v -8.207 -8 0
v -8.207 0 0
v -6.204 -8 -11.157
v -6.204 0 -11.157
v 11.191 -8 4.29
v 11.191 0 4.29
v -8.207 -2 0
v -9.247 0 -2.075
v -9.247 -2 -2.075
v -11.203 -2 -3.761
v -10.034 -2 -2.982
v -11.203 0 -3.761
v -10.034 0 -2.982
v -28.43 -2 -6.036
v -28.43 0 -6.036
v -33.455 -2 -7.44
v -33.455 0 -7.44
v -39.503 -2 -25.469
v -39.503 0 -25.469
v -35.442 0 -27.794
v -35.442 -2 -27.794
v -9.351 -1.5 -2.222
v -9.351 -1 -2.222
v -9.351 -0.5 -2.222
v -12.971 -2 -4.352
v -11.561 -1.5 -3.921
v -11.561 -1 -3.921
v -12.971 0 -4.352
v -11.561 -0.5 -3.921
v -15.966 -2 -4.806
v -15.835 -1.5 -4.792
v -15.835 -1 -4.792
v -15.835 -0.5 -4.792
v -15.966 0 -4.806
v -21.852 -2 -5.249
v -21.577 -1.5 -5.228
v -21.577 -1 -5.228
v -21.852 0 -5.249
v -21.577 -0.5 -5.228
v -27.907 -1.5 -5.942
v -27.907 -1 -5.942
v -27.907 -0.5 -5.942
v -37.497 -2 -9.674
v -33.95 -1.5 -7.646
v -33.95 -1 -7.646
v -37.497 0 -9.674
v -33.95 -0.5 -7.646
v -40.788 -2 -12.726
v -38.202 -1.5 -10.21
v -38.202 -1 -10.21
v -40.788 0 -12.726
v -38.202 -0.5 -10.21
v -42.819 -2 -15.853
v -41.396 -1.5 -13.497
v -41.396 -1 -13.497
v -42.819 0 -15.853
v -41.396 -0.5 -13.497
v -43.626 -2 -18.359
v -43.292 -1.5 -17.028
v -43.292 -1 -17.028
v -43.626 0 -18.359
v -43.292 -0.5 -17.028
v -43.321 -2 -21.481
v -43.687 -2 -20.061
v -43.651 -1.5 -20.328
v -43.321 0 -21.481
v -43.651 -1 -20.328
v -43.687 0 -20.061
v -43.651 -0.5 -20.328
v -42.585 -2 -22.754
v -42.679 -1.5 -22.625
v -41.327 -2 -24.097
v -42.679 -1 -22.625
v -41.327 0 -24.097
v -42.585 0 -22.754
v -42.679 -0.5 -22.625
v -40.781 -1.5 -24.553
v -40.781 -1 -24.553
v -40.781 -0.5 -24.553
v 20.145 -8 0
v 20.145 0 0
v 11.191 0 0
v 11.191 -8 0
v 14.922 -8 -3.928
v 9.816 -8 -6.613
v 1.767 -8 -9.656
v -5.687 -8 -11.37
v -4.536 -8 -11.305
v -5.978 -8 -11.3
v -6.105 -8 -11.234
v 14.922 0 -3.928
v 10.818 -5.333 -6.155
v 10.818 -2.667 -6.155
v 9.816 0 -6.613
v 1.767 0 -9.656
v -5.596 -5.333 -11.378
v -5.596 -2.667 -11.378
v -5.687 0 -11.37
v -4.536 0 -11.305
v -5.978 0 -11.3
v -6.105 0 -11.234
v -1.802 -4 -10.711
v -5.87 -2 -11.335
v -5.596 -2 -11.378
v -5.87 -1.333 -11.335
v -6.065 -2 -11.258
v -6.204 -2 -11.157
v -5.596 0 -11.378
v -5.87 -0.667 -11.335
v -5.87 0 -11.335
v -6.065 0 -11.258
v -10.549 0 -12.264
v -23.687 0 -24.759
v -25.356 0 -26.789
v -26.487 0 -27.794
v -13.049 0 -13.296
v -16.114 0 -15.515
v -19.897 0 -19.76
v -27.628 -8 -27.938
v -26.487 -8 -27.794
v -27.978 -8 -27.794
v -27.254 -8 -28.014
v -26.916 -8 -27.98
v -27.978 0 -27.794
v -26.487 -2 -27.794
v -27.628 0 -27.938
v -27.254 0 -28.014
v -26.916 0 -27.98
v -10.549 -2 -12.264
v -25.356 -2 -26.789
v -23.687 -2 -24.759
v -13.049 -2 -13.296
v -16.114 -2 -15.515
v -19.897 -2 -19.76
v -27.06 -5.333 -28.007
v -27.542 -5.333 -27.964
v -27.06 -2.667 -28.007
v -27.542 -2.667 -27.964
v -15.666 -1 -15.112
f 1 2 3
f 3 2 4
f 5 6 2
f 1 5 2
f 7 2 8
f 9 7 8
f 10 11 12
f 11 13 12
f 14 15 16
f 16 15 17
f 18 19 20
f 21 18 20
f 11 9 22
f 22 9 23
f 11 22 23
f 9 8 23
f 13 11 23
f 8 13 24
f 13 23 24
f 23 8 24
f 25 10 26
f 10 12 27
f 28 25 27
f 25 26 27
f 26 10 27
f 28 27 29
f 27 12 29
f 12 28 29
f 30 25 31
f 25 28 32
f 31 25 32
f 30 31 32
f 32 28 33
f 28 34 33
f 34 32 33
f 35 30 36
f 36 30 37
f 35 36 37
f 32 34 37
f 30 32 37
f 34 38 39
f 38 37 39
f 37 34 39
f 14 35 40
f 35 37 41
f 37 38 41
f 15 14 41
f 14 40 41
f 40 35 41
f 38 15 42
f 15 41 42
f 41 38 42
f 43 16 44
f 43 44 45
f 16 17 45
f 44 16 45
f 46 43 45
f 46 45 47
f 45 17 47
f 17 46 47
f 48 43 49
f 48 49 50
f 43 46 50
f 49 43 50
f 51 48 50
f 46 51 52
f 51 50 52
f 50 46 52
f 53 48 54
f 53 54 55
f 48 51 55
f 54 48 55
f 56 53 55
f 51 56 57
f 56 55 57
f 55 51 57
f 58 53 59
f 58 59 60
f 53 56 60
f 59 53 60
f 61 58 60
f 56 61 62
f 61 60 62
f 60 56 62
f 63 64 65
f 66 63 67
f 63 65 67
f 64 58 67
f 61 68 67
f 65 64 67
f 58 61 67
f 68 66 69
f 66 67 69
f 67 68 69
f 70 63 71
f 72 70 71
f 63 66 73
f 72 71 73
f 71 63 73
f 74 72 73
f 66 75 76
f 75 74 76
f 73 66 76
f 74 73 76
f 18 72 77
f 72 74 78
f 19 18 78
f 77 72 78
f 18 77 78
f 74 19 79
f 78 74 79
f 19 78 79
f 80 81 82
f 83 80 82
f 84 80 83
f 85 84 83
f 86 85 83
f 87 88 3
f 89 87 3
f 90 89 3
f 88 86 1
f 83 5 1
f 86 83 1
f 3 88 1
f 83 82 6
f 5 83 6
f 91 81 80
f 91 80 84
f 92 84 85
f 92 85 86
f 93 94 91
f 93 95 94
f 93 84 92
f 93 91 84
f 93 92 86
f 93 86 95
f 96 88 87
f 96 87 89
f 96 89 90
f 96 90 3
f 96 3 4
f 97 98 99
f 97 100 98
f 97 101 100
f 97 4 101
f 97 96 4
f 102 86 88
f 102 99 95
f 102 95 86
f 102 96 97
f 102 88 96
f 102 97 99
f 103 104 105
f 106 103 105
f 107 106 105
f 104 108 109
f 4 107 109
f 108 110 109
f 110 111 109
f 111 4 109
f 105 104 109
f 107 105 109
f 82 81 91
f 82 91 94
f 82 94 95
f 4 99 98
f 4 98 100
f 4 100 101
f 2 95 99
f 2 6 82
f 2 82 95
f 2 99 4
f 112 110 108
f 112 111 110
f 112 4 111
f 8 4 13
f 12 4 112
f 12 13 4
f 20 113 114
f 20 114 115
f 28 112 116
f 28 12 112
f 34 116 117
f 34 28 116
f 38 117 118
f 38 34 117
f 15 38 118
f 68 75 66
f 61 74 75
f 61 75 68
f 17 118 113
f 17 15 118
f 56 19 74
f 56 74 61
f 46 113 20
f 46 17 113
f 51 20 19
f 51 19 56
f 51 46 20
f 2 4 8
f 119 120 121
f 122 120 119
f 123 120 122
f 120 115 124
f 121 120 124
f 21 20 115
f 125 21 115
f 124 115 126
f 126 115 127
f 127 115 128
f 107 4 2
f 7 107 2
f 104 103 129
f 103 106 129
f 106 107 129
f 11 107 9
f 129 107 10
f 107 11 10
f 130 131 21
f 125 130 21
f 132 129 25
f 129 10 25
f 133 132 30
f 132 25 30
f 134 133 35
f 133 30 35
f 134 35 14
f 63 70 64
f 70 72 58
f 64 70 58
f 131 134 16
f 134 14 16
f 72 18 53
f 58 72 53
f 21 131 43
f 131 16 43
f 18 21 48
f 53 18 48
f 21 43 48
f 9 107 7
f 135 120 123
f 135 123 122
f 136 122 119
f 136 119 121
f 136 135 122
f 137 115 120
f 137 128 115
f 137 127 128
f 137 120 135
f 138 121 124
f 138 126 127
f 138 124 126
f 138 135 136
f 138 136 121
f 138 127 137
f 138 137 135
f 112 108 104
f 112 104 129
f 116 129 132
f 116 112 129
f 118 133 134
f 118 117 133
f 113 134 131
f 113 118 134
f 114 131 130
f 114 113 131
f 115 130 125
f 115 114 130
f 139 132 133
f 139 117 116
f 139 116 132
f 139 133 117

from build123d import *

# Parameters (mm, degrees)
F1_DEPTH = 8
F2_DEPTH = 2


with BuildPart() as f1:
    # F0 (on Front) → F1 (new body)
    with BuildSketch(Plane.XZ):
        with BuildLine():
            add(Edge.make_bspline(
                [(20.1446022838, 0), (17.7230486212, -2.0236935066), (12.2949855821, -6.5599282783), (-3.4915069167, -11.519306356), (-5.5957227014, -11.3779697567)],
                knots=[0, 0, 0, 0, 0.3976486487, 0.8913541607, 0.8913541607, 0.8913541607, 0.8913541607], degree=3))
            Line((20.1446022838, 0), (11.1914454028, 0))
            Line((11.1914454028, 0), (11.1914454028, 4.2900540866))
            Line((11.1914454028, 4.2900540866), (-8.207058534, 0))
            Line((-8.207058534, 0), (-6.2037032095, -11.1569330223))
            add(Edge.make_bspline(
                [(-5.5957227014, -11.3779697567), (-5.9179971815, -11.3563231274), (-6.0845258891, -11.2669270129), (-6.2037032095, -11.1569330223)],
                knots=[0.8913541607, 0.8913541607, 0.8913541607, 0.8913541607, 0.9669684054, 0.9669684054, 0.9669684054, 0.9669684054], degree=3))
        make_face()
    extrude(amount=F1_DEPTH)


with BuildPart() as f1b:
    # F0 (on Front) → F1, piece 2 (new body)
    with BuildSketch(Plane.XZ):
        with BuildLine():
            add(Edge.make_bspline(
                [(-26.4866650105, -27.7939904481), (-27.1214634238, -28.17702879), (-27.5499933026, -27.9856992329), (-27.9783869921, -27.7939904481)],
                knots=[0.8576413569, 0.8576413569, 0.8576413569, 0.8576413569, 0.9999060074, 0.9999060074, 0.9999060074, 0.9999060074], degree=3))
            Line((-26.4866650105, -27.7939904481), (-27.9783869921, -27.7939904481))
        make_face()
    extrude(amount=F1_DEPTH)


with BuildPart() as f2:
    # F0 (on Front) → F2 (new body)
    with BuildSketch(Plane.XZ):
        with BuildLine():
            add(Edge.make_bspline(
                [(-5.5957227014, -11.3779697567), (-8.9176387041, -11.761884659), (-16.3783046364, -12.6241162234), (-24.3637327392, -26.5130098407), (-26.4866650105, -27.7939904481)],
                knots=[0, 0, 0, 0, 0.3818710788, 0.8576413569, 0.8576413569, 0.8576413569, 0.8576413569], degree=3))
            add(Edge.make_bspline(
                [(-5.5957227014, -11.3779697567), (-5.9179971815, -11.3563231274), (-6.0845258891, -11.2669270129), (-6.2037032095, -11.1569330223)],
                knots=[0.8913541607, 0.8913541607, 0.8913541607, 0.8913541607, 0.9669684054, 0.9669684054, 0.9669684054, 0.9669684054], degree=3))
            Line((-6.2037032095, -11.1569330223), (-8.207058534, 0))
            add(Edge.make_bspline(
                [(-8.207058534, 0), (-8.8513348213, -1.5390488522), (-10.8468470095, -6.3059335005), (-35.3507202157, -3.3118054886), (-47.7065122281, -21.2305266581), (-39.2752425285, -25.74263409), (-35.4421027005, -27.7939904481)],
                knots=[0, 0, 0, 0, 0.1581557639, 0.48985468, 0.768070716, 1, 1, 1, 1], degree=3))
            Line((-35.4421027005, -27.7939904481), (-27.9783869921, -27.7939904481))
            Line((-27.9783869921, -27.7939904481), (-26.4866650105, -27.7939904481))
        make_face()
    extrude(amount=F2_DEPTH)


solid = Compound([f1.part, f1b.part, f2.part])
